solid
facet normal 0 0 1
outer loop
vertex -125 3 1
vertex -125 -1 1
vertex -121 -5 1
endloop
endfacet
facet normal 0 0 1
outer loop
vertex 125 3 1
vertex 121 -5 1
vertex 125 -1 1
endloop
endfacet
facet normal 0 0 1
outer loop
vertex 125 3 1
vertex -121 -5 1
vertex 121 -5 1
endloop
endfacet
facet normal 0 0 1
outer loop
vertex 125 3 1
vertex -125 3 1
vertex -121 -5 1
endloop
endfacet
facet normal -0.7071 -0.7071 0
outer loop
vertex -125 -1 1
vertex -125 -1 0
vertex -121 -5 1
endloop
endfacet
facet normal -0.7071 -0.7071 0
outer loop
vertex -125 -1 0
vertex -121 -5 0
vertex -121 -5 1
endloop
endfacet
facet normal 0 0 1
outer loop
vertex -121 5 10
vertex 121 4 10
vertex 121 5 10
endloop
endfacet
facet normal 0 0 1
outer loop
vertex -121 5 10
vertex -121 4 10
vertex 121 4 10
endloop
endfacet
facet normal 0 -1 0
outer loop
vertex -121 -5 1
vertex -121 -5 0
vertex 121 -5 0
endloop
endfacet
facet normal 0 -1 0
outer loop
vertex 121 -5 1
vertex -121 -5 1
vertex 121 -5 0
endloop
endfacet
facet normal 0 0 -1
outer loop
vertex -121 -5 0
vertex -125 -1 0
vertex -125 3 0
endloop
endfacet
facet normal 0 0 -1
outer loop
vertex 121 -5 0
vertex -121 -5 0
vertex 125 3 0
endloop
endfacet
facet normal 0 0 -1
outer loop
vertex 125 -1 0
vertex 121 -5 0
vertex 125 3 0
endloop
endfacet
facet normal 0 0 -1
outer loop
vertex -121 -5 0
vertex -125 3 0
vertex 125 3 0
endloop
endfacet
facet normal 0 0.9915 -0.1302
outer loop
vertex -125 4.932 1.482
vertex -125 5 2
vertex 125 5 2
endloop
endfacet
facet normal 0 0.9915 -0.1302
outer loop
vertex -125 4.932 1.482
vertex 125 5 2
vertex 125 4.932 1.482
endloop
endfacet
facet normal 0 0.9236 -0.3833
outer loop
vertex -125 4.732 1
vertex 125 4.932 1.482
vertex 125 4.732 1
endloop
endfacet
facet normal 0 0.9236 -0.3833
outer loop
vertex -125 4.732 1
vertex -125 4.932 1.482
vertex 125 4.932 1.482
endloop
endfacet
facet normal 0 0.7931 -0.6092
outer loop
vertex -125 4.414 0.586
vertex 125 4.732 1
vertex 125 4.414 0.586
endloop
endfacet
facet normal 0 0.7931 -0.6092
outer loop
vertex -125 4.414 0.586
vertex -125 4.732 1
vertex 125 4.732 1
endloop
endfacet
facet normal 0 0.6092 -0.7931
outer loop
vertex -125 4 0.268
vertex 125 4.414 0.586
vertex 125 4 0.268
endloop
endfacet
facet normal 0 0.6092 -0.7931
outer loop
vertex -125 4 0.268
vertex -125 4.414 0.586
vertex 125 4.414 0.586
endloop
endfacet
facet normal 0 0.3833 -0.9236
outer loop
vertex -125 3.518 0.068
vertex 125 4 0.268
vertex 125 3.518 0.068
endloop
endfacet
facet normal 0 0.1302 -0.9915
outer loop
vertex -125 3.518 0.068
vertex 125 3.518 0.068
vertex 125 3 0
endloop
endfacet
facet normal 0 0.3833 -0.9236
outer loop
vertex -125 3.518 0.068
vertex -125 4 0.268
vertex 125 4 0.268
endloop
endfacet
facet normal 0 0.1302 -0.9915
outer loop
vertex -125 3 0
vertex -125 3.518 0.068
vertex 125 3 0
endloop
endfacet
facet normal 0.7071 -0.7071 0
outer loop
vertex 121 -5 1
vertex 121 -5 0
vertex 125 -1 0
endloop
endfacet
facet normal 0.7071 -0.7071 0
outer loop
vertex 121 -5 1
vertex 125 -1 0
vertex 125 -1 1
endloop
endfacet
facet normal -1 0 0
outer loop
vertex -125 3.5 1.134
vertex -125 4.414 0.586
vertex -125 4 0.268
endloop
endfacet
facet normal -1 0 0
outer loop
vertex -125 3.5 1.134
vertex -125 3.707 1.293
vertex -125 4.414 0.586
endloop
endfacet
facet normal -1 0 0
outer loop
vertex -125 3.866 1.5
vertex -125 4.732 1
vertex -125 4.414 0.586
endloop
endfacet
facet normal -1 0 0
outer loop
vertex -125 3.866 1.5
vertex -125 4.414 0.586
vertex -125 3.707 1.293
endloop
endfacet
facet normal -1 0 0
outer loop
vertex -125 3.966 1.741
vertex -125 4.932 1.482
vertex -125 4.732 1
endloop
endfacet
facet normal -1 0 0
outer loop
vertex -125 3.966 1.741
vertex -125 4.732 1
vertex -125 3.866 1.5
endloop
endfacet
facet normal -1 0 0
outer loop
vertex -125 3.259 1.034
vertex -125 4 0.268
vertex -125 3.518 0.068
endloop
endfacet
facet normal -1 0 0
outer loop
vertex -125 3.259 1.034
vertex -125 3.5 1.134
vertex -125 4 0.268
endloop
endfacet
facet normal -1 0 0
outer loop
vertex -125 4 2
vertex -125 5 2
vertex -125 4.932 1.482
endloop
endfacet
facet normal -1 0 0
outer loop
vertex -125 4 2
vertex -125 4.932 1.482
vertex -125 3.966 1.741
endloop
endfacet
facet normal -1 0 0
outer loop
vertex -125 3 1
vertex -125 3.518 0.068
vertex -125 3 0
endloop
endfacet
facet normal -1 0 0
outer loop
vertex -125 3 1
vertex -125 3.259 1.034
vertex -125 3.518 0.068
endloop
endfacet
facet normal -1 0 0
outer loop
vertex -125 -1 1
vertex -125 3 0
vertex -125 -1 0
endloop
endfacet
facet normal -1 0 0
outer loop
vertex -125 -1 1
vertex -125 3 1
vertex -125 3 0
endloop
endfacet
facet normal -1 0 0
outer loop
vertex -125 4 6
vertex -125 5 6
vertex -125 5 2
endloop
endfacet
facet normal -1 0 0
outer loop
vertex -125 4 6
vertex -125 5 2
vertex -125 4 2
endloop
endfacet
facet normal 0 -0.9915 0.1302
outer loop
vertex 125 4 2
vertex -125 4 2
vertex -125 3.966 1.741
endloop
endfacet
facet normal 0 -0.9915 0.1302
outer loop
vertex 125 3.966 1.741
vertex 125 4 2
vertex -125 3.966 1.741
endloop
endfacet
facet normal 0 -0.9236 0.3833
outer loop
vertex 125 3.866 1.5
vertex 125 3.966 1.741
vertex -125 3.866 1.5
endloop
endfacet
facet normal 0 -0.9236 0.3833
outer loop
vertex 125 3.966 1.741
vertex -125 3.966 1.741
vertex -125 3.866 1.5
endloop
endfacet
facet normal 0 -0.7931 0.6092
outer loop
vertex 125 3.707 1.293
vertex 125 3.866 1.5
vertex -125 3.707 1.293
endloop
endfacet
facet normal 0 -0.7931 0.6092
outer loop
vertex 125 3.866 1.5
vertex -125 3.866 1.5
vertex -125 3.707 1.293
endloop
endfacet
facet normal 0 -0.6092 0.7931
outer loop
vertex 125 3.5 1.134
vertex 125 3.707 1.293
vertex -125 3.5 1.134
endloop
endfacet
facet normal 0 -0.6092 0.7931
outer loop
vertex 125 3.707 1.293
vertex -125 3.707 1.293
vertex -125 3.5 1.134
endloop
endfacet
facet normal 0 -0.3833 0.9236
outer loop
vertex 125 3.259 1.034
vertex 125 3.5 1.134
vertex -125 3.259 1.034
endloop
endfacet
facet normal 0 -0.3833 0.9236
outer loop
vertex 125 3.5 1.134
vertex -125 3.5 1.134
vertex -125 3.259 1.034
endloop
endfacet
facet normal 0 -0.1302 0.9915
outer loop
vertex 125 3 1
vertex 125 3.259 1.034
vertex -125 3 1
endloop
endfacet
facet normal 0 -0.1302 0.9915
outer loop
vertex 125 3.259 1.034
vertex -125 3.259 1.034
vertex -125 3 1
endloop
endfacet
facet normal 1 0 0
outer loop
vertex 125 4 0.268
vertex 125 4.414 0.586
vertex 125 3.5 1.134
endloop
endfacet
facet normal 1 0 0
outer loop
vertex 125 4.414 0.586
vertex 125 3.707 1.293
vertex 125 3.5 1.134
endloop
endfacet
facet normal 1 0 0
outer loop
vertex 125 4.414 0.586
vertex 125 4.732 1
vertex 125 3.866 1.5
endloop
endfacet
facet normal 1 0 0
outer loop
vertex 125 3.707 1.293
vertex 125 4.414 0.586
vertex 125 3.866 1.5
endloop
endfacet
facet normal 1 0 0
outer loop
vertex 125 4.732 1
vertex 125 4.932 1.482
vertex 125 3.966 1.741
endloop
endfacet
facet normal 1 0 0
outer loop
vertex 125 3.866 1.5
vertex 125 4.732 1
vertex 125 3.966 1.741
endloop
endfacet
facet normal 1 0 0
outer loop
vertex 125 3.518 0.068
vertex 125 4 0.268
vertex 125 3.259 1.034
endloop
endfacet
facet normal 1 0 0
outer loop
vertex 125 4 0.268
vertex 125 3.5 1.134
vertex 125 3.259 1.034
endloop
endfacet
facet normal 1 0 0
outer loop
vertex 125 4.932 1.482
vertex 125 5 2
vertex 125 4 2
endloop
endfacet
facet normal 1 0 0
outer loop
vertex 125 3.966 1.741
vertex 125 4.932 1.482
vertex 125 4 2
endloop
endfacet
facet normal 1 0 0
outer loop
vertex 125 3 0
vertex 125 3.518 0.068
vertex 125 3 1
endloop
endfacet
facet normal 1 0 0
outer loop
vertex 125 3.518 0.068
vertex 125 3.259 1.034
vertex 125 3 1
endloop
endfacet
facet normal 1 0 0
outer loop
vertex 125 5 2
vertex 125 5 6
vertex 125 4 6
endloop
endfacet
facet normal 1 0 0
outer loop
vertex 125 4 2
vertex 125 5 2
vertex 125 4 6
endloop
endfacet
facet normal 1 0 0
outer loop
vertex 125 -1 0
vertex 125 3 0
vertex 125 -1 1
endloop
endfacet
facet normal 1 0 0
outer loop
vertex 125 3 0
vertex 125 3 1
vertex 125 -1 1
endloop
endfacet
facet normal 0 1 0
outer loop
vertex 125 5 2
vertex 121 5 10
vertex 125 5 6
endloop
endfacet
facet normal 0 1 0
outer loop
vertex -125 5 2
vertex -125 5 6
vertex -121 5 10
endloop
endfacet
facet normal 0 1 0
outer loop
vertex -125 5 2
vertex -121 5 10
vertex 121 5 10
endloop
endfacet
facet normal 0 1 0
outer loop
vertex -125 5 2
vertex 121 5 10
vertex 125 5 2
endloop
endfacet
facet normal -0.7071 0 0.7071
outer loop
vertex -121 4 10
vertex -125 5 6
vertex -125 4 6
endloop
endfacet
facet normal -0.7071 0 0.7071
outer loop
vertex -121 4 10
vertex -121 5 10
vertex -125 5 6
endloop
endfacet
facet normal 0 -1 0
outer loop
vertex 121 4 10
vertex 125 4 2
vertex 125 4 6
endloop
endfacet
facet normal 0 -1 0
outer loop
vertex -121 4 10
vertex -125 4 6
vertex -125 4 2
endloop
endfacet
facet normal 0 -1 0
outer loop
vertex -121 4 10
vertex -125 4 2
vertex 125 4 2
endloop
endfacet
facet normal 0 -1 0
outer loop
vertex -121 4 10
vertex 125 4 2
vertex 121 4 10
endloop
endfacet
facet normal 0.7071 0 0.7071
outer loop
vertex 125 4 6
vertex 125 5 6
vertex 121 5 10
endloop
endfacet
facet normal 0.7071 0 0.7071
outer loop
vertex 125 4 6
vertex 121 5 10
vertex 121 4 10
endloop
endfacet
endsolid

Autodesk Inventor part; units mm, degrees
ref_plane "YZ Plane" through (0, 0, 0) normal (1, 0, 0) x (0, 1, 0)
ref_plane "XZ Plane" through (0, 0, 0) normal (0, 1, 0) x (-1, 0, 0)
ref_plane "XY Plane" through (0, 0, 0) normal (0, 0, 1) x (1, 0, 0)
sketch "Sketch1" plane through (0, 0, 0) normal (0, 0, 1) x (1, 0, 0)
  line L0 (-125, -5) -> (125, -5)
  line L1 (125, -5) -> (125, 5)
  line L2 (125, 5) -> (-125, 5)
  line L3 (-125, 5) -> (-125, -5)
  line L4 (-125, -5) -> (125, 5) construction
  line L5 (125, -5) -> (-125, 5) construction
  point P0 (0, 0)
  dimension "d0" = 250
  dimension "d1" = 10
extrude "Plate1" add sketch "Sketch1" along normal blind 1
sketch "Sketch2" plane through (-125, 4, 0) normal (0, 1, 0) x (-1, 0, 0)
  line L0 (-250, 0) -> (0, 0)
  line L1 (0, 0) -> (0, 10)
  line L2 (0, 10) -> (-250, 10)
  line L3 (-250, 10) -> (-250, 0)
edge flange "Flange1" height 10 angle 90 thickness 1 bend radius 1 thickness toward (0, 1, 0) relief tear relief width 1 relief depth 0.5 edges at (0, 5, 1) wall of the first edge with corners at (125, 4, 0) (-125, 4, 0) (-125, 4, 10) (125, 4, 10)
bend "Bend1"
corner "Corner1"
chamfer "Corner Chamfer1" distance 4 angle 45 4 edges at (-125, 4.5, 10) (125, -5, 0.5) (125, 4.5, 10) (-125, -5, 0.5)
equation "\"d3\" = BendReliefWidth"
equation "\"d4\" = BendReliefDepth"
equation "\"d5\" = MinimumRemnant"
equation "\"d6\" = BendRadius"
equation "\"d9\" = BendRadius"
equation "\"d10\" = CornerReliefSize"
equation "\"d11\" = GapSize"
equation "\"d12\" = JacobiRadiusSize"
equation "\"BendRadius\" = Thickness"
equation "\"BendReliefWidth\" = Thickness"
equation "\"BendReliefDepth\" = 0.5 * Thickness"
equation "\"CornerReliefSize\" = 4 * Thickness"
equation "\"MinimumRemnant\" = 2 * Thickness"
equation "\"TransitionRadius\" = BendRadius"
equation "\"JacobiRadiusSize\" = BendRadius"
equation "\"GapSize\" = Thickness"
equation "\"d2\" = BendRadius"
equation "\"Thickness\" = 1"
